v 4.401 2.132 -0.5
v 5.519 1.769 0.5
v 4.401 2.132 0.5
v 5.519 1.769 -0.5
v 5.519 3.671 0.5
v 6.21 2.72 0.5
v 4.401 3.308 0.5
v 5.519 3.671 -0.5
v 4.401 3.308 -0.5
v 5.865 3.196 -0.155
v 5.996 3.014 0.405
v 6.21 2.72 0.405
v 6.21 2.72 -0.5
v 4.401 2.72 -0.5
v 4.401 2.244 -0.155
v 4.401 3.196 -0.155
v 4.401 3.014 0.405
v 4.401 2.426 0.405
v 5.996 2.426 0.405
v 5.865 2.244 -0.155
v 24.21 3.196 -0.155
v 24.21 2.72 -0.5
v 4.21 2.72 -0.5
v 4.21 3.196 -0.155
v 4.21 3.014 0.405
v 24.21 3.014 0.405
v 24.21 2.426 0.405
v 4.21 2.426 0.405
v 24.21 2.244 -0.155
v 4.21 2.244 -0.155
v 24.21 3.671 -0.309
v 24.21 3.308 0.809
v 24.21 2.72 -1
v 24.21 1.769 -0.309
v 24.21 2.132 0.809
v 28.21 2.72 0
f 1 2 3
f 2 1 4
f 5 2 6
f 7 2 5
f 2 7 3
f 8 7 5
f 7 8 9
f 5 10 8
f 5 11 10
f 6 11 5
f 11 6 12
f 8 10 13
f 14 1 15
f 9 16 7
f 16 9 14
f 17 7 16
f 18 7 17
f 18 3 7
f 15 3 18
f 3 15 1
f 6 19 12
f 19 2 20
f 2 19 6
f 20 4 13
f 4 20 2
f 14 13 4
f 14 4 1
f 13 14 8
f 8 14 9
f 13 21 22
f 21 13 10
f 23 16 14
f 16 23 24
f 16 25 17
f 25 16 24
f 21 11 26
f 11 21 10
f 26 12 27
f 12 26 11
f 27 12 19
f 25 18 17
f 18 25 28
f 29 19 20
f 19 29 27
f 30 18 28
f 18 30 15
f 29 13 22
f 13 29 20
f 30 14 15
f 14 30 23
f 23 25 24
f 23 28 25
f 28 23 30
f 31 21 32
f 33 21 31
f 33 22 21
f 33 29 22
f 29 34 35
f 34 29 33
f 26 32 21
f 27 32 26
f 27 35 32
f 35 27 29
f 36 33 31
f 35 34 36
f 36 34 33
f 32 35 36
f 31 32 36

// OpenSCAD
// Parameters
A_x = 5.21; //[2.605:10.42:0.01]
A_y = 2.72; //[1.36:5.44:0.01]
A_z = 0; //[min:-5:max:5:step:0.01]
axis_line_length = 20; //[10:40:1]
axis_line_diameter = 1; //[0.5:2:0.1]
axis_line_overlap = 1; //[0.5:2:0.1]
ref_point_diameter = 2; //[1:4:0.1]
ref_point_height = 1; //[0.5:3:0.1]
arrowhead_length = 4; //[2:8:0.5]
arrowhead_diameter = 2; //[1:4:0.1]

// Axial Reference Point
module axial_reference_point() {
  color("Red")
  translate([A_x, A_y, A_z])
    cylinder(r=ref_point_diameter/2, h=ref_point_height, center=true);
}

// Axis Line Indicator
module axis_line_indicator() {
  color("Blue")
  translate([A_x + axis_line_length/2 - axis_line_overlap, A_y, A_z])
    rotate([0, 90, 0])
      cylinder(r=axis_line_diameter/2, h=axis_line_length, center=true);
}

// Arrowhead Marker
module arrowhead_marker() {
  color("Green")
  translate([A_x + axis_line_length - axis_line_overlap + arrowhead_length/2, A_y, A_z])
    rotate([0, 90, 0])
      cylinder(r1=arrowhead_diameter/2, r2=0, h=arrowhead_length, center=true);
}

// Complete Model
module complete_model() {
  union() {
    axial_reference_point();
    axis_line_indicator();
    arrowhead_marker();
    // Text label is ignored as per rules
  }
}

// Render the complete model
complete_model();
